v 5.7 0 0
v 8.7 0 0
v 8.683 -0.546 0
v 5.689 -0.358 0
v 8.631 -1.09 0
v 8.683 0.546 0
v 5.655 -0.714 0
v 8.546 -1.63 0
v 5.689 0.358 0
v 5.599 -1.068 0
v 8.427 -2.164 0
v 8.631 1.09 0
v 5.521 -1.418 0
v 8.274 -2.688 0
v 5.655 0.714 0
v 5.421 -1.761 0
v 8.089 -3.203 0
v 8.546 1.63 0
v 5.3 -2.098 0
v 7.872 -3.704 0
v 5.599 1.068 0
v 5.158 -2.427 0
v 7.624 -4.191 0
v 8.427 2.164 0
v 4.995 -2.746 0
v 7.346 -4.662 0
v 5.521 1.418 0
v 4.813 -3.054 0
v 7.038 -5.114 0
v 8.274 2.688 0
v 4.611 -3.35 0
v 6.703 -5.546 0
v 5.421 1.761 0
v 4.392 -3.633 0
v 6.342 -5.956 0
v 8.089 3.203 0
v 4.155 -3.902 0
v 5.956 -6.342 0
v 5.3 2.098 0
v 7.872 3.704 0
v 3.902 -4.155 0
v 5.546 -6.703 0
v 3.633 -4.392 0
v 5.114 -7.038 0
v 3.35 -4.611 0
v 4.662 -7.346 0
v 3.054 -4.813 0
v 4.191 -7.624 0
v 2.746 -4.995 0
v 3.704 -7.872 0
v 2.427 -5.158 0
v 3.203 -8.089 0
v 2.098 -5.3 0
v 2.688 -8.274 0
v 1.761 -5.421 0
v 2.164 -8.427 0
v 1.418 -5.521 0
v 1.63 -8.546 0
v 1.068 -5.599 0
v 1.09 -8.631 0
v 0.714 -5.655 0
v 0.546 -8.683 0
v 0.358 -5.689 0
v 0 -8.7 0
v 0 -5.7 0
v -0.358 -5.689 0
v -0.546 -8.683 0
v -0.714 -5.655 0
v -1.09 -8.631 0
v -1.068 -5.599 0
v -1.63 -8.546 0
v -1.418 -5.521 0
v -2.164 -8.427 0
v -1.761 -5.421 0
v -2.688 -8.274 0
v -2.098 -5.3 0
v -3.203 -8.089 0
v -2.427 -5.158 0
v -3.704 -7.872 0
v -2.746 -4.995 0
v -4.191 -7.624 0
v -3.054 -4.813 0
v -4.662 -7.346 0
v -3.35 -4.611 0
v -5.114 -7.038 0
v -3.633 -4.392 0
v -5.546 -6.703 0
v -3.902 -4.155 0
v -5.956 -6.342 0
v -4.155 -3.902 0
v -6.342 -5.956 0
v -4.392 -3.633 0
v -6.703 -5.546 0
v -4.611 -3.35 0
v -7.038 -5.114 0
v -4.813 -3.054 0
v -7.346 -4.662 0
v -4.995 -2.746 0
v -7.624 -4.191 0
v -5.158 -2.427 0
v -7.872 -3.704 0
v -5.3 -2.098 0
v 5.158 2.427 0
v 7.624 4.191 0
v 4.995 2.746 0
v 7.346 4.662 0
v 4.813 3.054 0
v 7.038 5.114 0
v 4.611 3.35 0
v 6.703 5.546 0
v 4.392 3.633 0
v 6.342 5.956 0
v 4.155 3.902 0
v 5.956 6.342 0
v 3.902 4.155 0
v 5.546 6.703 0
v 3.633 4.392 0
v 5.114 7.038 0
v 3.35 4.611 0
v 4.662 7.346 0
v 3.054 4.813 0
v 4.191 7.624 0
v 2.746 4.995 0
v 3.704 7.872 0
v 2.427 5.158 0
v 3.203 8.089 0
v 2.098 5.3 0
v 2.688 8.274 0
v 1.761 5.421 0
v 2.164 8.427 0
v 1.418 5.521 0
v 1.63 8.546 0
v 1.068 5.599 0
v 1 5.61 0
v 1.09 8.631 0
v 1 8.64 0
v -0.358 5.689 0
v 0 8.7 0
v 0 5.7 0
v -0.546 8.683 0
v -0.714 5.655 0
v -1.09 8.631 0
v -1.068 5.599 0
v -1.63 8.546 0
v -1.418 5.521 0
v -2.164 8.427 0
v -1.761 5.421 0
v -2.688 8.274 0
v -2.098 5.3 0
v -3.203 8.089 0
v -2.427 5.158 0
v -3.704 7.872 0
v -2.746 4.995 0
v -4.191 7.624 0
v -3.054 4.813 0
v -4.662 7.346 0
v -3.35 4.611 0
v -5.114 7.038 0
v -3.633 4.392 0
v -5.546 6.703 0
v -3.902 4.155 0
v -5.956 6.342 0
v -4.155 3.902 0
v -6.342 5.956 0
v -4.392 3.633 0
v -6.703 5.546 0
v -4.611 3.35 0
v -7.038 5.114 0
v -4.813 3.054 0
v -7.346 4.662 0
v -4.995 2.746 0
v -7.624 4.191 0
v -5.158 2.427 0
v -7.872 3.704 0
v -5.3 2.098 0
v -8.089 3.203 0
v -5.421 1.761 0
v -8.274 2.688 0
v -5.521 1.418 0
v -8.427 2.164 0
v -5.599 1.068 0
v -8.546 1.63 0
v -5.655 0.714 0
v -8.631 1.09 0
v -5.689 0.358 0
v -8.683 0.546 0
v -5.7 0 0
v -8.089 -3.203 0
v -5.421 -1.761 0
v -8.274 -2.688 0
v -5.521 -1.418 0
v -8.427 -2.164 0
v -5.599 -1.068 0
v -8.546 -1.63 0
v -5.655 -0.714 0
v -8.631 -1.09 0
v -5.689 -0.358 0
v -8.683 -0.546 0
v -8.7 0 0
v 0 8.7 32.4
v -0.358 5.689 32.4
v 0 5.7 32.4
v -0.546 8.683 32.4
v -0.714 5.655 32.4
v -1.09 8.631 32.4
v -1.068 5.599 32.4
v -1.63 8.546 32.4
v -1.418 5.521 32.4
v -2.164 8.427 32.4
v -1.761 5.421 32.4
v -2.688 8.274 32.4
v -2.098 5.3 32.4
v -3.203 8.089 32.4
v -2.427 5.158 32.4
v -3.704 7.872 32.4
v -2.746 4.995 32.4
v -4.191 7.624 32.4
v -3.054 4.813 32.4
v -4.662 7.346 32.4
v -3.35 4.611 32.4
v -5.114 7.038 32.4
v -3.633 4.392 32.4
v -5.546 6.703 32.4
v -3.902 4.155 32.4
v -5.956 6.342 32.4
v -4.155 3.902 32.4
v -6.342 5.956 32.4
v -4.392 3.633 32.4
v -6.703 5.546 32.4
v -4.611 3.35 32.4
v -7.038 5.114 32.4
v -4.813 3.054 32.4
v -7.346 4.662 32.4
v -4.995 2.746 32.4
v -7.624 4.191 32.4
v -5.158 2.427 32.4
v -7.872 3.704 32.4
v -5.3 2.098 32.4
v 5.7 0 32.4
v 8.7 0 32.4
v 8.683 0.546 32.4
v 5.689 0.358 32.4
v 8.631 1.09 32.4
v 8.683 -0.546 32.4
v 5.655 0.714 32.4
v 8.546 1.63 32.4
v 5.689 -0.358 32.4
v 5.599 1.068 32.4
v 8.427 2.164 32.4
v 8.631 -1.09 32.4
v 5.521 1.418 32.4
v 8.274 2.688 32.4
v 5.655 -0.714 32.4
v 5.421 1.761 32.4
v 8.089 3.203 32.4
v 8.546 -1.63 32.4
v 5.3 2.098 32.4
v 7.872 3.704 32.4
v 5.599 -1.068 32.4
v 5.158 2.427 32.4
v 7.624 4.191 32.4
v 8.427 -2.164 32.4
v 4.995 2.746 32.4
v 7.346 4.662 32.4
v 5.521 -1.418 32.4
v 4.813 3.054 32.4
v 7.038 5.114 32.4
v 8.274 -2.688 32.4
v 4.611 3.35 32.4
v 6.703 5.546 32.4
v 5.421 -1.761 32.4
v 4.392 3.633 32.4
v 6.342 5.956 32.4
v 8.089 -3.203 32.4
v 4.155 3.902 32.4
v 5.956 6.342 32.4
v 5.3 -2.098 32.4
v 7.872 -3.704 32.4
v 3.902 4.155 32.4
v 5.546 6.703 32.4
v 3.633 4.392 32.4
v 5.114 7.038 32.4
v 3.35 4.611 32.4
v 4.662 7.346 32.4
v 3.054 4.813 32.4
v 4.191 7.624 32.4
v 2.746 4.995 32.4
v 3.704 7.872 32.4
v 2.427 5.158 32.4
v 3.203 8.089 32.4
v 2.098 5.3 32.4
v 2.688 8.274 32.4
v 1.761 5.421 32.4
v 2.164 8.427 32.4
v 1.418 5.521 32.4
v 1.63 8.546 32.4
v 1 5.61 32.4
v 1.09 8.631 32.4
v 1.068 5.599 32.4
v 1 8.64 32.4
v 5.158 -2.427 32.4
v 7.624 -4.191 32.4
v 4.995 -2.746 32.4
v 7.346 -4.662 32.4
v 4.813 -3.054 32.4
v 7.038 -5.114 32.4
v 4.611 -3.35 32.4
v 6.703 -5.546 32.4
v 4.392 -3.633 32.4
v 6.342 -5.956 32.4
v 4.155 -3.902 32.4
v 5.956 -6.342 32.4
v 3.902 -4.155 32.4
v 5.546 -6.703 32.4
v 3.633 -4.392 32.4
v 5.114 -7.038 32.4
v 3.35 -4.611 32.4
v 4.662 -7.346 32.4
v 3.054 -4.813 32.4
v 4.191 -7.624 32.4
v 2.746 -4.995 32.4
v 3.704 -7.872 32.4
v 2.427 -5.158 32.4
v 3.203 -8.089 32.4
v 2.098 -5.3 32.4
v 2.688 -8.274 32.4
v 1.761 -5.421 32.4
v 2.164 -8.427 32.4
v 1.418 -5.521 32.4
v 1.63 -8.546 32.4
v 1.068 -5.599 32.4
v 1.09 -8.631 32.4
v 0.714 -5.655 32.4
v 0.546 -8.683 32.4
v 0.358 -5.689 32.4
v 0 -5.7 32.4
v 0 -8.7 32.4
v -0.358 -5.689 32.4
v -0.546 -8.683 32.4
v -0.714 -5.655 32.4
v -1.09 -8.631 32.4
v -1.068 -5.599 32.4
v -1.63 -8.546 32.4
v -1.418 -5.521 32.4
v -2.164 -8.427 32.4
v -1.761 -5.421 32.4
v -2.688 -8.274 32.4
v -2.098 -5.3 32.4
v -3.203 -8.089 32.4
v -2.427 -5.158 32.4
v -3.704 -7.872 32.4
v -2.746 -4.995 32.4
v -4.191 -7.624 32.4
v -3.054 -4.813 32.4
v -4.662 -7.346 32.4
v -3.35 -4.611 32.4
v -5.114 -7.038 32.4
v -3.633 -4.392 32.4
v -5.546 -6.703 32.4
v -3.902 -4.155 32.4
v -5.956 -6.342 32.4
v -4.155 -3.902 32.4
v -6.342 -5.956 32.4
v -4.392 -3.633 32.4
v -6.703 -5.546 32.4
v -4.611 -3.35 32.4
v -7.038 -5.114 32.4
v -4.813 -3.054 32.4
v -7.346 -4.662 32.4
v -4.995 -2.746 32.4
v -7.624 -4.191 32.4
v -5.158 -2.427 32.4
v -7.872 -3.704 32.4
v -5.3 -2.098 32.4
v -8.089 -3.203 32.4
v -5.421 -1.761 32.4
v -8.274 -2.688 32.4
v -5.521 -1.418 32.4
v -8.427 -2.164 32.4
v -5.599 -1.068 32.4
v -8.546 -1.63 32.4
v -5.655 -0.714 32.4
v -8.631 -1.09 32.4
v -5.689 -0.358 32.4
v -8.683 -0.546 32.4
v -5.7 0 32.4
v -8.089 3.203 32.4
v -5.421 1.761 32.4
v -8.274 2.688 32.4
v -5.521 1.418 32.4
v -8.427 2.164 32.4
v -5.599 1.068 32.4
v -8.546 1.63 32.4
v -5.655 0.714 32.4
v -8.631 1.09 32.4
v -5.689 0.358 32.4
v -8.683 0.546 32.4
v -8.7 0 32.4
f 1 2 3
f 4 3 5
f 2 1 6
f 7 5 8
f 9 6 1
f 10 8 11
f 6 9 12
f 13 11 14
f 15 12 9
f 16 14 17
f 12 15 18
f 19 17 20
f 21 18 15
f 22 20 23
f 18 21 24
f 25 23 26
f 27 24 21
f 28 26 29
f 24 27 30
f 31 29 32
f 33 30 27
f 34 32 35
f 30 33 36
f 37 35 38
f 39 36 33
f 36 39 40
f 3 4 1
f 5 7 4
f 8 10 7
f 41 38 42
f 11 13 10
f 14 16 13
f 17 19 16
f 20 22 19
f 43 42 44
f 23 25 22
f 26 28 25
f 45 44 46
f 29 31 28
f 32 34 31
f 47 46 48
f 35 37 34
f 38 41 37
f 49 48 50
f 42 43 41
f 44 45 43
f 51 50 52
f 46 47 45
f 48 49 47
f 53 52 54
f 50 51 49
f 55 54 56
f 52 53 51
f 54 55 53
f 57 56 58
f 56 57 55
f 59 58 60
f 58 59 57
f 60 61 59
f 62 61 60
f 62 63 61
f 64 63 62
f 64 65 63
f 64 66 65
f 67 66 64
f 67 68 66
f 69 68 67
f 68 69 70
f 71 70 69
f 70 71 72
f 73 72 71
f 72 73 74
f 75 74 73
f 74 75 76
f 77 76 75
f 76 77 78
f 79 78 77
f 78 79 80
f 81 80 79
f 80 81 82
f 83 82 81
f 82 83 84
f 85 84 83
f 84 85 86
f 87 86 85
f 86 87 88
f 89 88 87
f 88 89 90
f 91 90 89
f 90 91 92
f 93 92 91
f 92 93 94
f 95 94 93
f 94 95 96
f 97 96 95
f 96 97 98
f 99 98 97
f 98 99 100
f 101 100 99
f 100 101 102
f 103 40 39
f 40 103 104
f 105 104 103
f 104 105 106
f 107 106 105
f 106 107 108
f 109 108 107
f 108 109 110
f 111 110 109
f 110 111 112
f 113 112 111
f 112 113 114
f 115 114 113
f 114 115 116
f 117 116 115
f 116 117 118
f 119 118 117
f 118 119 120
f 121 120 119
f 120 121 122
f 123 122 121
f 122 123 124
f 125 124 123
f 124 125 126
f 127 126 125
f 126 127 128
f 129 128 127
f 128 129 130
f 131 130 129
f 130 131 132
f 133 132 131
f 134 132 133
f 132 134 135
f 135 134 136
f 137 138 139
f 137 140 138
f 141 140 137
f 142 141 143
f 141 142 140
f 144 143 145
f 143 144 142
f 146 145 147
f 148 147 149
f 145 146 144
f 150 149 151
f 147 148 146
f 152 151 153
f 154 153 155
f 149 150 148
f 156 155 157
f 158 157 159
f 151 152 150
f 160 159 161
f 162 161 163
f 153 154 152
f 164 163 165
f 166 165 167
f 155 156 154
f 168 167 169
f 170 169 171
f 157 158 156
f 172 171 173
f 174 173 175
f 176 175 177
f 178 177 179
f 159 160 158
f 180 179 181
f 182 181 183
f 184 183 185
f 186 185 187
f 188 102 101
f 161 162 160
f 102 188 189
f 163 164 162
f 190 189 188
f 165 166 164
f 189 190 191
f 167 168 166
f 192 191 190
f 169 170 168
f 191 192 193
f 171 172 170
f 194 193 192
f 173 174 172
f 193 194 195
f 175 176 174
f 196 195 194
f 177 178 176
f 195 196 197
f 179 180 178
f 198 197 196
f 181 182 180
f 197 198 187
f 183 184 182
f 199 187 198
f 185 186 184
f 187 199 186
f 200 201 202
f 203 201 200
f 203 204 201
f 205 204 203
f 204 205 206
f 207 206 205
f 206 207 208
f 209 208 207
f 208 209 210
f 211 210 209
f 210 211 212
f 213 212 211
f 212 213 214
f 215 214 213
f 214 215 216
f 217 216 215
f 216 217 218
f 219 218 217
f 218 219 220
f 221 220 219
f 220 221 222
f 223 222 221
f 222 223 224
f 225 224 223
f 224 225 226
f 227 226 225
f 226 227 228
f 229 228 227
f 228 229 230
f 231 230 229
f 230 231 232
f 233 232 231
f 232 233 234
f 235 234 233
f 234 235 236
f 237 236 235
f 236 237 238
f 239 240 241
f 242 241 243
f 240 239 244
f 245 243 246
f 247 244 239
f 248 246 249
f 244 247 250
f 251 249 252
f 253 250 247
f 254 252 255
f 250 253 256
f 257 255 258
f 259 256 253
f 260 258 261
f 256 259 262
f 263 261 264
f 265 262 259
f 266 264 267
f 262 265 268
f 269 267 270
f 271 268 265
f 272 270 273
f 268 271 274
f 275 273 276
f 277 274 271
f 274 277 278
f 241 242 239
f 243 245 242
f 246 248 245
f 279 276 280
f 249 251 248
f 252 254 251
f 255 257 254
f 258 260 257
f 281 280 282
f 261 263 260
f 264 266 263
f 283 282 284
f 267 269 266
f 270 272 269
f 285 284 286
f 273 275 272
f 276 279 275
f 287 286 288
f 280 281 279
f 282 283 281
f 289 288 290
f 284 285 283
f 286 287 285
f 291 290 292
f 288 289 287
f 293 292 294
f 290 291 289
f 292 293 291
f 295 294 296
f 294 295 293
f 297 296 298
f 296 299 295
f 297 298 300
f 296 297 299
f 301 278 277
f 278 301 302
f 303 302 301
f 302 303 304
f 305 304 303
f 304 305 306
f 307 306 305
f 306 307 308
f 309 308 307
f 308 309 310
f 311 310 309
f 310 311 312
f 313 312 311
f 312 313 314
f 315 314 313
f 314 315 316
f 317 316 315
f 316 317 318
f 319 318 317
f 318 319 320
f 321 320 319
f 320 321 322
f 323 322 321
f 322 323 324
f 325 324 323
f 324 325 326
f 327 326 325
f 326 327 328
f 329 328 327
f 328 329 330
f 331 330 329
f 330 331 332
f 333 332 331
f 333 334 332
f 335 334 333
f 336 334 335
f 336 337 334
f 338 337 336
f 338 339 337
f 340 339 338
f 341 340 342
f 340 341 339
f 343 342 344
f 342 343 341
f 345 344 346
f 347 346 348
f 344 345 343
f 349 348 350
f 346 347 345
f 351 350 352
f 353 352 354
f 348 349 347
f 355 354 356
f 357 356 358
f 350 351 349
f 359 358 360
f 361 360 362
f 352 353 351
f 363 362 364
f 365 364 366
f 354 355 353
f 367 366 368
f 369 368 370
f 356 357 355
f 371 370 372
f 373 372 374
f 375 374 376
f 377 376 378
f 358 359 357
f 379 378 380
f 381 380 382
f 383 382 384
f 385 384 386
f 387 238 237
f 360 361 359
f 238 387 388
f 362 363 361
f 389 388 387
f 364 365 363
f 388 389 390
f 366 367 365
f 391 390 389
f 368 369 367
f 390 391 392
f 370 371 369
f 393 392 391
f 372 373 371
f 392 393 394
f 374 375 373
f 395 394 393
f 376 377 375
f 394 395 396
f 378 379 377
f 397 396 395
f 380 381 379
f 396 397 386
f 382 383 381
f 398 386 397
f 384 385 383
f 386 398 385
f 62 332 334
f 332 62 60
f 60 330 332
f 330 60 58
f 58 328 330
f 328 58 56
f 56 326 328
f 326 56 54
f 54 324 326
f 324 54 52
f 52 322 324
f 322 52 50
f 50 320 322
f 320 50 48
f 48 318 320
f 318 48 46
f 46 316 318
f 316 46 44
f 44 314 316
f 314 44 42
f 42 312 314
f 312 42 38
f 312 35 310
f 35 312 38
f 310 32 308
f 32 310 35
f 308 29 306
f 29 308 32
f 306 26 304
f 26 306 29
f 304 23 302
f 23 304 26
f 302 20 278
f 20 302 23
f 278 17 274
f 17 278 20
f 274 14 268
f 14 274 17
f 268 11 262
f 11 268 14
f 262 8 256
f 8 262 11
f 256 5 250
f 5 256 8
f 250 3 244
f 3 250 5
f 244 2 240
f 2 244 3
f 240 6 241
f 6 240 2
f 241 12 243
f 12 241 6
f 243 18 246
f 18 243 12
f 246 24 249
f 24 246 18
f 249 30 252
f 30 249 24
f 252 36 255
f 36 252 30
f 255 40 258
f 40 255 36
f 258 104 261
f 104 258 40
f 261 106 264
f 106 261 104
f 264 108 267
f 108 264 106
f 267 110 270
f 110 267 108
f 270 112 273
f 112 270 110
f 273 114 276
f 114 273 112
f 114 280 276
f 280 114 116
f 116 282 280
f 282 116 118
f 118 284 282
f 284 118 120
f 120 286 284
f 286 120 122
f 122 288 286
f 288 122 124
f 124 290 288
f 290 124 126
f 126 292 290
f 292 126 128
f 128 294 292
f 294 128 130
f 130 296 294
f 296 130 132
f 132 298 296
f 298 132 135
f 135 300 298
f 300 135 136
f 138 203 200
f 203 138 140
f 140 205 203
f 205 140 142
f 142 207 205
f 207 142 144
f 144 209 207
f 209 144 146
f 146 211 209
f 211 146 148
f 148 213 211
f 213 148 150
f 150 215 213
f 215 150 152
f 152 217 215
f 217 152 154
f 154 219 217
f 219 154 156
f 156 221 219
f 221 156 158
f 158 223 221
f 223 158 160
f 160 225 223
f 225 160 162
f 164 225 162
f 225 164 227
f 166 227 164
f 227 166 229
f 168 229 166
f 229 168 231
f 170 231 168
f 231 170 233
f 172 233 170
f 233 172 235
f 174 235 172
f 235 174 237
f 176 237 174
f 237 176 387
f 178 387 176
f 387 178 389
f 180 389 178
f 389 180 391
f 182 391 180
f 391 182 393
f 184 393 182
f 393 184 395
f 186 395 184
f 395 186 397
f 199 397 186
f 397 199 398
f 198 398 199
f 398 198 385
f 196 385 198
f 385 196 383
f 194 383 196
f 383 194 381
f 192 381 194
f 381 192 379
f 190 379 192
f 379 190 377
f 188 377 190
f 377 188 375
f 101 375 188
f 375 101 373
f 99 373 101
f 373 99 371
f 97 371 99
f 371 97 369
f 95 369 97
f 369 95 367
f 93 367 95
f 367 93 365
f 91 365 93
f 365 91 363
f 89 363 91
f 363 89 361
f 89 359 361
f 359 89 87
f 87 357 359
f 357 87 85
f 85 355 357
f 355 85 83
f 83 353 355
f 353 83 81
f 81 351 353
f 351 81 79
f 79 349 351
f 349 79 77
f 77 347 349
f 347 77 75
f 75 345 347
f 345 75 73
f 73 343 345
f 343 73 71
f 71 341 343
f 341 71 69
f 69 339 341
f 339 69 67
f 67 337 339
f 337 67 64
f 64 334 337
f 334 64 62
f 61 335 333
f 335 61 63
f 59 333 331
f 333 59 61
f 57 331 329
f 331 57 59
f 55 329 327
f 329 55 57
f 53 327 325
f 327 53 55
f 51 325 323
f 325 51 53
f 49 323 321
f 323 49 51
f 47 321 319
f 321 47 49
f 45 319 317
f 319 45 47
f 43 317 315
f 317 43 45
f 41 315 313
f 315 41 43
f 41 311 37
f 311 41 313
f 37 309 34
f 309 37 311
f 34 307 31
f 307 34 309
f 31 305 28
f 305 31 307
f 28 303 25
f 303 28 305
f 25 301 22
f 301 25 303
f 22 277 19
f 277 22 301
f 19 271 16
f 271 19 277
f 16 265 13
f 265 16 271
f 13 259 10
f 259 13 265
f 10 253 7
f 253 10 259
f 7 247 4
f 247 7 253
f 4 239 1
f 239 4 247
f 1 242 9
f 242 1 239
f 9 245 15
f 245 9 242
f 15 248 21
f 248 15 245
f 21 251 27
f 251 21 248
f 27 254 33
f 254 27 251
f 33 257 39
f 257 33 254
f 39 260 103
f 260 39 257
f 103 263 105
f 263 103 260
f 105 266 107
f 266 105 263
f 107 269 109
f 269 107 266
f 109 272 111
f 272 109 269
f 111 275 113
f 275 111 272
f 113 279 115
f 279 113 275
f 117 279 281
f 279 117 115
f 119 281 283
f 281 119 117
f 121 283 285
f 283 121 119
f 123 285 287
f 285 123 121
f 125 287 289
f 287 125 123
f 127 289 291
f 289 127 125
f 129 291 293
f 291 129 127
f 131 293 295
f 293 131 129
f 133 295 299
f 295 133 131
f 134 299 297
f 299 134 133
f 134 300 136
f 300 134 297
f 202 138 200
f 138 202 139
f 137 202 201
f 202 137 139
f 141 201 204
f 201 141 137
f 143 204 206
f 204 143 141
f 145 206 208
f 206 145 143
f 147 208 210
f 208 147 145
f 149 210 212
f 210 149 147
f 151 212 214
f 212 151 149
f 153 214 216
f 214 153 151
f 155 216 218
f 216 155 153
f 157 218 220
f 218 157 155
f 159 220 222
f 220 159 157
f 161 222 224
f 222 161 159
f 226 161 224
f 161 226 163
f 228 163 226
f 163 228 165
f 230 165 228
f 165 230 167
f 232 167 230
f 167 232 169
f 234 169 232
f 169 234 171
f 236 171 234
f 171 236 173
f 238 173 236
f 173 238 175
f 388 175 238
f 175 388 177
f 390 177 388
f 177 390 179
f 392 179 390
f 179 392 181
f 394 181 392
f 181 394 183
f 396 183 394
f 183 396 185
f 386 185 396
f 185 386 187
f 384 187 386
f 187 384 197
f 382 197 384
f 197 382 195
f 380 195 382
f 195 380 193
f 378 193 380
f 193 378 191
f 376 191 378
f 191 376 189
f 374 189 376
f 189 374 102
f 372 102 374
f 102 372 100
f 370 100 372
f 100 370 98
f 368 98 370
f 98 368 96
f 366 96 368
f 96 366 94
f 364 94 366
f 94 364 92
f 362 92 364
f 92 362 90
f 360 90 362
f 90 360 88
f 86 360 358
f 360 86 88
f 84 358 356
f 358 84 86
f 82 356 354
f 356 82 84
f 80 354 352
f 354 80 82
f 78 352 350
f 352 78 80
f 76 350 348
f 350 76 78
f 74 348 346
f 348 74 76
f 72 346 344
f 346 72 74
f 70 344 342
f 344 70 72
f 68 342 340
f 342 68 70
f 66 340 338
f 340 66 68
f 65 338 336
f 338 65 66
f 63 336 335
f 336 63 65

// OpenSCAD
use <myTools.scad>
/*
module tube (r = 0, d = 0, l = 0, 
            thick = 0, 
            bCentered = true, 
            taper_pct = 0, 
            circlip = false) // r=radius d=dia l=length ;
*/
$fn=100;
DIA=11.50 - .1;
BAT_THICKNESS = 5.40;
NUM = 6;
color("BLUE")
tube (d = DIA, l = NUM * BAT_THICKNESS, thick = +3, bCentered = false, taper_pct = 0, circlip = true);
